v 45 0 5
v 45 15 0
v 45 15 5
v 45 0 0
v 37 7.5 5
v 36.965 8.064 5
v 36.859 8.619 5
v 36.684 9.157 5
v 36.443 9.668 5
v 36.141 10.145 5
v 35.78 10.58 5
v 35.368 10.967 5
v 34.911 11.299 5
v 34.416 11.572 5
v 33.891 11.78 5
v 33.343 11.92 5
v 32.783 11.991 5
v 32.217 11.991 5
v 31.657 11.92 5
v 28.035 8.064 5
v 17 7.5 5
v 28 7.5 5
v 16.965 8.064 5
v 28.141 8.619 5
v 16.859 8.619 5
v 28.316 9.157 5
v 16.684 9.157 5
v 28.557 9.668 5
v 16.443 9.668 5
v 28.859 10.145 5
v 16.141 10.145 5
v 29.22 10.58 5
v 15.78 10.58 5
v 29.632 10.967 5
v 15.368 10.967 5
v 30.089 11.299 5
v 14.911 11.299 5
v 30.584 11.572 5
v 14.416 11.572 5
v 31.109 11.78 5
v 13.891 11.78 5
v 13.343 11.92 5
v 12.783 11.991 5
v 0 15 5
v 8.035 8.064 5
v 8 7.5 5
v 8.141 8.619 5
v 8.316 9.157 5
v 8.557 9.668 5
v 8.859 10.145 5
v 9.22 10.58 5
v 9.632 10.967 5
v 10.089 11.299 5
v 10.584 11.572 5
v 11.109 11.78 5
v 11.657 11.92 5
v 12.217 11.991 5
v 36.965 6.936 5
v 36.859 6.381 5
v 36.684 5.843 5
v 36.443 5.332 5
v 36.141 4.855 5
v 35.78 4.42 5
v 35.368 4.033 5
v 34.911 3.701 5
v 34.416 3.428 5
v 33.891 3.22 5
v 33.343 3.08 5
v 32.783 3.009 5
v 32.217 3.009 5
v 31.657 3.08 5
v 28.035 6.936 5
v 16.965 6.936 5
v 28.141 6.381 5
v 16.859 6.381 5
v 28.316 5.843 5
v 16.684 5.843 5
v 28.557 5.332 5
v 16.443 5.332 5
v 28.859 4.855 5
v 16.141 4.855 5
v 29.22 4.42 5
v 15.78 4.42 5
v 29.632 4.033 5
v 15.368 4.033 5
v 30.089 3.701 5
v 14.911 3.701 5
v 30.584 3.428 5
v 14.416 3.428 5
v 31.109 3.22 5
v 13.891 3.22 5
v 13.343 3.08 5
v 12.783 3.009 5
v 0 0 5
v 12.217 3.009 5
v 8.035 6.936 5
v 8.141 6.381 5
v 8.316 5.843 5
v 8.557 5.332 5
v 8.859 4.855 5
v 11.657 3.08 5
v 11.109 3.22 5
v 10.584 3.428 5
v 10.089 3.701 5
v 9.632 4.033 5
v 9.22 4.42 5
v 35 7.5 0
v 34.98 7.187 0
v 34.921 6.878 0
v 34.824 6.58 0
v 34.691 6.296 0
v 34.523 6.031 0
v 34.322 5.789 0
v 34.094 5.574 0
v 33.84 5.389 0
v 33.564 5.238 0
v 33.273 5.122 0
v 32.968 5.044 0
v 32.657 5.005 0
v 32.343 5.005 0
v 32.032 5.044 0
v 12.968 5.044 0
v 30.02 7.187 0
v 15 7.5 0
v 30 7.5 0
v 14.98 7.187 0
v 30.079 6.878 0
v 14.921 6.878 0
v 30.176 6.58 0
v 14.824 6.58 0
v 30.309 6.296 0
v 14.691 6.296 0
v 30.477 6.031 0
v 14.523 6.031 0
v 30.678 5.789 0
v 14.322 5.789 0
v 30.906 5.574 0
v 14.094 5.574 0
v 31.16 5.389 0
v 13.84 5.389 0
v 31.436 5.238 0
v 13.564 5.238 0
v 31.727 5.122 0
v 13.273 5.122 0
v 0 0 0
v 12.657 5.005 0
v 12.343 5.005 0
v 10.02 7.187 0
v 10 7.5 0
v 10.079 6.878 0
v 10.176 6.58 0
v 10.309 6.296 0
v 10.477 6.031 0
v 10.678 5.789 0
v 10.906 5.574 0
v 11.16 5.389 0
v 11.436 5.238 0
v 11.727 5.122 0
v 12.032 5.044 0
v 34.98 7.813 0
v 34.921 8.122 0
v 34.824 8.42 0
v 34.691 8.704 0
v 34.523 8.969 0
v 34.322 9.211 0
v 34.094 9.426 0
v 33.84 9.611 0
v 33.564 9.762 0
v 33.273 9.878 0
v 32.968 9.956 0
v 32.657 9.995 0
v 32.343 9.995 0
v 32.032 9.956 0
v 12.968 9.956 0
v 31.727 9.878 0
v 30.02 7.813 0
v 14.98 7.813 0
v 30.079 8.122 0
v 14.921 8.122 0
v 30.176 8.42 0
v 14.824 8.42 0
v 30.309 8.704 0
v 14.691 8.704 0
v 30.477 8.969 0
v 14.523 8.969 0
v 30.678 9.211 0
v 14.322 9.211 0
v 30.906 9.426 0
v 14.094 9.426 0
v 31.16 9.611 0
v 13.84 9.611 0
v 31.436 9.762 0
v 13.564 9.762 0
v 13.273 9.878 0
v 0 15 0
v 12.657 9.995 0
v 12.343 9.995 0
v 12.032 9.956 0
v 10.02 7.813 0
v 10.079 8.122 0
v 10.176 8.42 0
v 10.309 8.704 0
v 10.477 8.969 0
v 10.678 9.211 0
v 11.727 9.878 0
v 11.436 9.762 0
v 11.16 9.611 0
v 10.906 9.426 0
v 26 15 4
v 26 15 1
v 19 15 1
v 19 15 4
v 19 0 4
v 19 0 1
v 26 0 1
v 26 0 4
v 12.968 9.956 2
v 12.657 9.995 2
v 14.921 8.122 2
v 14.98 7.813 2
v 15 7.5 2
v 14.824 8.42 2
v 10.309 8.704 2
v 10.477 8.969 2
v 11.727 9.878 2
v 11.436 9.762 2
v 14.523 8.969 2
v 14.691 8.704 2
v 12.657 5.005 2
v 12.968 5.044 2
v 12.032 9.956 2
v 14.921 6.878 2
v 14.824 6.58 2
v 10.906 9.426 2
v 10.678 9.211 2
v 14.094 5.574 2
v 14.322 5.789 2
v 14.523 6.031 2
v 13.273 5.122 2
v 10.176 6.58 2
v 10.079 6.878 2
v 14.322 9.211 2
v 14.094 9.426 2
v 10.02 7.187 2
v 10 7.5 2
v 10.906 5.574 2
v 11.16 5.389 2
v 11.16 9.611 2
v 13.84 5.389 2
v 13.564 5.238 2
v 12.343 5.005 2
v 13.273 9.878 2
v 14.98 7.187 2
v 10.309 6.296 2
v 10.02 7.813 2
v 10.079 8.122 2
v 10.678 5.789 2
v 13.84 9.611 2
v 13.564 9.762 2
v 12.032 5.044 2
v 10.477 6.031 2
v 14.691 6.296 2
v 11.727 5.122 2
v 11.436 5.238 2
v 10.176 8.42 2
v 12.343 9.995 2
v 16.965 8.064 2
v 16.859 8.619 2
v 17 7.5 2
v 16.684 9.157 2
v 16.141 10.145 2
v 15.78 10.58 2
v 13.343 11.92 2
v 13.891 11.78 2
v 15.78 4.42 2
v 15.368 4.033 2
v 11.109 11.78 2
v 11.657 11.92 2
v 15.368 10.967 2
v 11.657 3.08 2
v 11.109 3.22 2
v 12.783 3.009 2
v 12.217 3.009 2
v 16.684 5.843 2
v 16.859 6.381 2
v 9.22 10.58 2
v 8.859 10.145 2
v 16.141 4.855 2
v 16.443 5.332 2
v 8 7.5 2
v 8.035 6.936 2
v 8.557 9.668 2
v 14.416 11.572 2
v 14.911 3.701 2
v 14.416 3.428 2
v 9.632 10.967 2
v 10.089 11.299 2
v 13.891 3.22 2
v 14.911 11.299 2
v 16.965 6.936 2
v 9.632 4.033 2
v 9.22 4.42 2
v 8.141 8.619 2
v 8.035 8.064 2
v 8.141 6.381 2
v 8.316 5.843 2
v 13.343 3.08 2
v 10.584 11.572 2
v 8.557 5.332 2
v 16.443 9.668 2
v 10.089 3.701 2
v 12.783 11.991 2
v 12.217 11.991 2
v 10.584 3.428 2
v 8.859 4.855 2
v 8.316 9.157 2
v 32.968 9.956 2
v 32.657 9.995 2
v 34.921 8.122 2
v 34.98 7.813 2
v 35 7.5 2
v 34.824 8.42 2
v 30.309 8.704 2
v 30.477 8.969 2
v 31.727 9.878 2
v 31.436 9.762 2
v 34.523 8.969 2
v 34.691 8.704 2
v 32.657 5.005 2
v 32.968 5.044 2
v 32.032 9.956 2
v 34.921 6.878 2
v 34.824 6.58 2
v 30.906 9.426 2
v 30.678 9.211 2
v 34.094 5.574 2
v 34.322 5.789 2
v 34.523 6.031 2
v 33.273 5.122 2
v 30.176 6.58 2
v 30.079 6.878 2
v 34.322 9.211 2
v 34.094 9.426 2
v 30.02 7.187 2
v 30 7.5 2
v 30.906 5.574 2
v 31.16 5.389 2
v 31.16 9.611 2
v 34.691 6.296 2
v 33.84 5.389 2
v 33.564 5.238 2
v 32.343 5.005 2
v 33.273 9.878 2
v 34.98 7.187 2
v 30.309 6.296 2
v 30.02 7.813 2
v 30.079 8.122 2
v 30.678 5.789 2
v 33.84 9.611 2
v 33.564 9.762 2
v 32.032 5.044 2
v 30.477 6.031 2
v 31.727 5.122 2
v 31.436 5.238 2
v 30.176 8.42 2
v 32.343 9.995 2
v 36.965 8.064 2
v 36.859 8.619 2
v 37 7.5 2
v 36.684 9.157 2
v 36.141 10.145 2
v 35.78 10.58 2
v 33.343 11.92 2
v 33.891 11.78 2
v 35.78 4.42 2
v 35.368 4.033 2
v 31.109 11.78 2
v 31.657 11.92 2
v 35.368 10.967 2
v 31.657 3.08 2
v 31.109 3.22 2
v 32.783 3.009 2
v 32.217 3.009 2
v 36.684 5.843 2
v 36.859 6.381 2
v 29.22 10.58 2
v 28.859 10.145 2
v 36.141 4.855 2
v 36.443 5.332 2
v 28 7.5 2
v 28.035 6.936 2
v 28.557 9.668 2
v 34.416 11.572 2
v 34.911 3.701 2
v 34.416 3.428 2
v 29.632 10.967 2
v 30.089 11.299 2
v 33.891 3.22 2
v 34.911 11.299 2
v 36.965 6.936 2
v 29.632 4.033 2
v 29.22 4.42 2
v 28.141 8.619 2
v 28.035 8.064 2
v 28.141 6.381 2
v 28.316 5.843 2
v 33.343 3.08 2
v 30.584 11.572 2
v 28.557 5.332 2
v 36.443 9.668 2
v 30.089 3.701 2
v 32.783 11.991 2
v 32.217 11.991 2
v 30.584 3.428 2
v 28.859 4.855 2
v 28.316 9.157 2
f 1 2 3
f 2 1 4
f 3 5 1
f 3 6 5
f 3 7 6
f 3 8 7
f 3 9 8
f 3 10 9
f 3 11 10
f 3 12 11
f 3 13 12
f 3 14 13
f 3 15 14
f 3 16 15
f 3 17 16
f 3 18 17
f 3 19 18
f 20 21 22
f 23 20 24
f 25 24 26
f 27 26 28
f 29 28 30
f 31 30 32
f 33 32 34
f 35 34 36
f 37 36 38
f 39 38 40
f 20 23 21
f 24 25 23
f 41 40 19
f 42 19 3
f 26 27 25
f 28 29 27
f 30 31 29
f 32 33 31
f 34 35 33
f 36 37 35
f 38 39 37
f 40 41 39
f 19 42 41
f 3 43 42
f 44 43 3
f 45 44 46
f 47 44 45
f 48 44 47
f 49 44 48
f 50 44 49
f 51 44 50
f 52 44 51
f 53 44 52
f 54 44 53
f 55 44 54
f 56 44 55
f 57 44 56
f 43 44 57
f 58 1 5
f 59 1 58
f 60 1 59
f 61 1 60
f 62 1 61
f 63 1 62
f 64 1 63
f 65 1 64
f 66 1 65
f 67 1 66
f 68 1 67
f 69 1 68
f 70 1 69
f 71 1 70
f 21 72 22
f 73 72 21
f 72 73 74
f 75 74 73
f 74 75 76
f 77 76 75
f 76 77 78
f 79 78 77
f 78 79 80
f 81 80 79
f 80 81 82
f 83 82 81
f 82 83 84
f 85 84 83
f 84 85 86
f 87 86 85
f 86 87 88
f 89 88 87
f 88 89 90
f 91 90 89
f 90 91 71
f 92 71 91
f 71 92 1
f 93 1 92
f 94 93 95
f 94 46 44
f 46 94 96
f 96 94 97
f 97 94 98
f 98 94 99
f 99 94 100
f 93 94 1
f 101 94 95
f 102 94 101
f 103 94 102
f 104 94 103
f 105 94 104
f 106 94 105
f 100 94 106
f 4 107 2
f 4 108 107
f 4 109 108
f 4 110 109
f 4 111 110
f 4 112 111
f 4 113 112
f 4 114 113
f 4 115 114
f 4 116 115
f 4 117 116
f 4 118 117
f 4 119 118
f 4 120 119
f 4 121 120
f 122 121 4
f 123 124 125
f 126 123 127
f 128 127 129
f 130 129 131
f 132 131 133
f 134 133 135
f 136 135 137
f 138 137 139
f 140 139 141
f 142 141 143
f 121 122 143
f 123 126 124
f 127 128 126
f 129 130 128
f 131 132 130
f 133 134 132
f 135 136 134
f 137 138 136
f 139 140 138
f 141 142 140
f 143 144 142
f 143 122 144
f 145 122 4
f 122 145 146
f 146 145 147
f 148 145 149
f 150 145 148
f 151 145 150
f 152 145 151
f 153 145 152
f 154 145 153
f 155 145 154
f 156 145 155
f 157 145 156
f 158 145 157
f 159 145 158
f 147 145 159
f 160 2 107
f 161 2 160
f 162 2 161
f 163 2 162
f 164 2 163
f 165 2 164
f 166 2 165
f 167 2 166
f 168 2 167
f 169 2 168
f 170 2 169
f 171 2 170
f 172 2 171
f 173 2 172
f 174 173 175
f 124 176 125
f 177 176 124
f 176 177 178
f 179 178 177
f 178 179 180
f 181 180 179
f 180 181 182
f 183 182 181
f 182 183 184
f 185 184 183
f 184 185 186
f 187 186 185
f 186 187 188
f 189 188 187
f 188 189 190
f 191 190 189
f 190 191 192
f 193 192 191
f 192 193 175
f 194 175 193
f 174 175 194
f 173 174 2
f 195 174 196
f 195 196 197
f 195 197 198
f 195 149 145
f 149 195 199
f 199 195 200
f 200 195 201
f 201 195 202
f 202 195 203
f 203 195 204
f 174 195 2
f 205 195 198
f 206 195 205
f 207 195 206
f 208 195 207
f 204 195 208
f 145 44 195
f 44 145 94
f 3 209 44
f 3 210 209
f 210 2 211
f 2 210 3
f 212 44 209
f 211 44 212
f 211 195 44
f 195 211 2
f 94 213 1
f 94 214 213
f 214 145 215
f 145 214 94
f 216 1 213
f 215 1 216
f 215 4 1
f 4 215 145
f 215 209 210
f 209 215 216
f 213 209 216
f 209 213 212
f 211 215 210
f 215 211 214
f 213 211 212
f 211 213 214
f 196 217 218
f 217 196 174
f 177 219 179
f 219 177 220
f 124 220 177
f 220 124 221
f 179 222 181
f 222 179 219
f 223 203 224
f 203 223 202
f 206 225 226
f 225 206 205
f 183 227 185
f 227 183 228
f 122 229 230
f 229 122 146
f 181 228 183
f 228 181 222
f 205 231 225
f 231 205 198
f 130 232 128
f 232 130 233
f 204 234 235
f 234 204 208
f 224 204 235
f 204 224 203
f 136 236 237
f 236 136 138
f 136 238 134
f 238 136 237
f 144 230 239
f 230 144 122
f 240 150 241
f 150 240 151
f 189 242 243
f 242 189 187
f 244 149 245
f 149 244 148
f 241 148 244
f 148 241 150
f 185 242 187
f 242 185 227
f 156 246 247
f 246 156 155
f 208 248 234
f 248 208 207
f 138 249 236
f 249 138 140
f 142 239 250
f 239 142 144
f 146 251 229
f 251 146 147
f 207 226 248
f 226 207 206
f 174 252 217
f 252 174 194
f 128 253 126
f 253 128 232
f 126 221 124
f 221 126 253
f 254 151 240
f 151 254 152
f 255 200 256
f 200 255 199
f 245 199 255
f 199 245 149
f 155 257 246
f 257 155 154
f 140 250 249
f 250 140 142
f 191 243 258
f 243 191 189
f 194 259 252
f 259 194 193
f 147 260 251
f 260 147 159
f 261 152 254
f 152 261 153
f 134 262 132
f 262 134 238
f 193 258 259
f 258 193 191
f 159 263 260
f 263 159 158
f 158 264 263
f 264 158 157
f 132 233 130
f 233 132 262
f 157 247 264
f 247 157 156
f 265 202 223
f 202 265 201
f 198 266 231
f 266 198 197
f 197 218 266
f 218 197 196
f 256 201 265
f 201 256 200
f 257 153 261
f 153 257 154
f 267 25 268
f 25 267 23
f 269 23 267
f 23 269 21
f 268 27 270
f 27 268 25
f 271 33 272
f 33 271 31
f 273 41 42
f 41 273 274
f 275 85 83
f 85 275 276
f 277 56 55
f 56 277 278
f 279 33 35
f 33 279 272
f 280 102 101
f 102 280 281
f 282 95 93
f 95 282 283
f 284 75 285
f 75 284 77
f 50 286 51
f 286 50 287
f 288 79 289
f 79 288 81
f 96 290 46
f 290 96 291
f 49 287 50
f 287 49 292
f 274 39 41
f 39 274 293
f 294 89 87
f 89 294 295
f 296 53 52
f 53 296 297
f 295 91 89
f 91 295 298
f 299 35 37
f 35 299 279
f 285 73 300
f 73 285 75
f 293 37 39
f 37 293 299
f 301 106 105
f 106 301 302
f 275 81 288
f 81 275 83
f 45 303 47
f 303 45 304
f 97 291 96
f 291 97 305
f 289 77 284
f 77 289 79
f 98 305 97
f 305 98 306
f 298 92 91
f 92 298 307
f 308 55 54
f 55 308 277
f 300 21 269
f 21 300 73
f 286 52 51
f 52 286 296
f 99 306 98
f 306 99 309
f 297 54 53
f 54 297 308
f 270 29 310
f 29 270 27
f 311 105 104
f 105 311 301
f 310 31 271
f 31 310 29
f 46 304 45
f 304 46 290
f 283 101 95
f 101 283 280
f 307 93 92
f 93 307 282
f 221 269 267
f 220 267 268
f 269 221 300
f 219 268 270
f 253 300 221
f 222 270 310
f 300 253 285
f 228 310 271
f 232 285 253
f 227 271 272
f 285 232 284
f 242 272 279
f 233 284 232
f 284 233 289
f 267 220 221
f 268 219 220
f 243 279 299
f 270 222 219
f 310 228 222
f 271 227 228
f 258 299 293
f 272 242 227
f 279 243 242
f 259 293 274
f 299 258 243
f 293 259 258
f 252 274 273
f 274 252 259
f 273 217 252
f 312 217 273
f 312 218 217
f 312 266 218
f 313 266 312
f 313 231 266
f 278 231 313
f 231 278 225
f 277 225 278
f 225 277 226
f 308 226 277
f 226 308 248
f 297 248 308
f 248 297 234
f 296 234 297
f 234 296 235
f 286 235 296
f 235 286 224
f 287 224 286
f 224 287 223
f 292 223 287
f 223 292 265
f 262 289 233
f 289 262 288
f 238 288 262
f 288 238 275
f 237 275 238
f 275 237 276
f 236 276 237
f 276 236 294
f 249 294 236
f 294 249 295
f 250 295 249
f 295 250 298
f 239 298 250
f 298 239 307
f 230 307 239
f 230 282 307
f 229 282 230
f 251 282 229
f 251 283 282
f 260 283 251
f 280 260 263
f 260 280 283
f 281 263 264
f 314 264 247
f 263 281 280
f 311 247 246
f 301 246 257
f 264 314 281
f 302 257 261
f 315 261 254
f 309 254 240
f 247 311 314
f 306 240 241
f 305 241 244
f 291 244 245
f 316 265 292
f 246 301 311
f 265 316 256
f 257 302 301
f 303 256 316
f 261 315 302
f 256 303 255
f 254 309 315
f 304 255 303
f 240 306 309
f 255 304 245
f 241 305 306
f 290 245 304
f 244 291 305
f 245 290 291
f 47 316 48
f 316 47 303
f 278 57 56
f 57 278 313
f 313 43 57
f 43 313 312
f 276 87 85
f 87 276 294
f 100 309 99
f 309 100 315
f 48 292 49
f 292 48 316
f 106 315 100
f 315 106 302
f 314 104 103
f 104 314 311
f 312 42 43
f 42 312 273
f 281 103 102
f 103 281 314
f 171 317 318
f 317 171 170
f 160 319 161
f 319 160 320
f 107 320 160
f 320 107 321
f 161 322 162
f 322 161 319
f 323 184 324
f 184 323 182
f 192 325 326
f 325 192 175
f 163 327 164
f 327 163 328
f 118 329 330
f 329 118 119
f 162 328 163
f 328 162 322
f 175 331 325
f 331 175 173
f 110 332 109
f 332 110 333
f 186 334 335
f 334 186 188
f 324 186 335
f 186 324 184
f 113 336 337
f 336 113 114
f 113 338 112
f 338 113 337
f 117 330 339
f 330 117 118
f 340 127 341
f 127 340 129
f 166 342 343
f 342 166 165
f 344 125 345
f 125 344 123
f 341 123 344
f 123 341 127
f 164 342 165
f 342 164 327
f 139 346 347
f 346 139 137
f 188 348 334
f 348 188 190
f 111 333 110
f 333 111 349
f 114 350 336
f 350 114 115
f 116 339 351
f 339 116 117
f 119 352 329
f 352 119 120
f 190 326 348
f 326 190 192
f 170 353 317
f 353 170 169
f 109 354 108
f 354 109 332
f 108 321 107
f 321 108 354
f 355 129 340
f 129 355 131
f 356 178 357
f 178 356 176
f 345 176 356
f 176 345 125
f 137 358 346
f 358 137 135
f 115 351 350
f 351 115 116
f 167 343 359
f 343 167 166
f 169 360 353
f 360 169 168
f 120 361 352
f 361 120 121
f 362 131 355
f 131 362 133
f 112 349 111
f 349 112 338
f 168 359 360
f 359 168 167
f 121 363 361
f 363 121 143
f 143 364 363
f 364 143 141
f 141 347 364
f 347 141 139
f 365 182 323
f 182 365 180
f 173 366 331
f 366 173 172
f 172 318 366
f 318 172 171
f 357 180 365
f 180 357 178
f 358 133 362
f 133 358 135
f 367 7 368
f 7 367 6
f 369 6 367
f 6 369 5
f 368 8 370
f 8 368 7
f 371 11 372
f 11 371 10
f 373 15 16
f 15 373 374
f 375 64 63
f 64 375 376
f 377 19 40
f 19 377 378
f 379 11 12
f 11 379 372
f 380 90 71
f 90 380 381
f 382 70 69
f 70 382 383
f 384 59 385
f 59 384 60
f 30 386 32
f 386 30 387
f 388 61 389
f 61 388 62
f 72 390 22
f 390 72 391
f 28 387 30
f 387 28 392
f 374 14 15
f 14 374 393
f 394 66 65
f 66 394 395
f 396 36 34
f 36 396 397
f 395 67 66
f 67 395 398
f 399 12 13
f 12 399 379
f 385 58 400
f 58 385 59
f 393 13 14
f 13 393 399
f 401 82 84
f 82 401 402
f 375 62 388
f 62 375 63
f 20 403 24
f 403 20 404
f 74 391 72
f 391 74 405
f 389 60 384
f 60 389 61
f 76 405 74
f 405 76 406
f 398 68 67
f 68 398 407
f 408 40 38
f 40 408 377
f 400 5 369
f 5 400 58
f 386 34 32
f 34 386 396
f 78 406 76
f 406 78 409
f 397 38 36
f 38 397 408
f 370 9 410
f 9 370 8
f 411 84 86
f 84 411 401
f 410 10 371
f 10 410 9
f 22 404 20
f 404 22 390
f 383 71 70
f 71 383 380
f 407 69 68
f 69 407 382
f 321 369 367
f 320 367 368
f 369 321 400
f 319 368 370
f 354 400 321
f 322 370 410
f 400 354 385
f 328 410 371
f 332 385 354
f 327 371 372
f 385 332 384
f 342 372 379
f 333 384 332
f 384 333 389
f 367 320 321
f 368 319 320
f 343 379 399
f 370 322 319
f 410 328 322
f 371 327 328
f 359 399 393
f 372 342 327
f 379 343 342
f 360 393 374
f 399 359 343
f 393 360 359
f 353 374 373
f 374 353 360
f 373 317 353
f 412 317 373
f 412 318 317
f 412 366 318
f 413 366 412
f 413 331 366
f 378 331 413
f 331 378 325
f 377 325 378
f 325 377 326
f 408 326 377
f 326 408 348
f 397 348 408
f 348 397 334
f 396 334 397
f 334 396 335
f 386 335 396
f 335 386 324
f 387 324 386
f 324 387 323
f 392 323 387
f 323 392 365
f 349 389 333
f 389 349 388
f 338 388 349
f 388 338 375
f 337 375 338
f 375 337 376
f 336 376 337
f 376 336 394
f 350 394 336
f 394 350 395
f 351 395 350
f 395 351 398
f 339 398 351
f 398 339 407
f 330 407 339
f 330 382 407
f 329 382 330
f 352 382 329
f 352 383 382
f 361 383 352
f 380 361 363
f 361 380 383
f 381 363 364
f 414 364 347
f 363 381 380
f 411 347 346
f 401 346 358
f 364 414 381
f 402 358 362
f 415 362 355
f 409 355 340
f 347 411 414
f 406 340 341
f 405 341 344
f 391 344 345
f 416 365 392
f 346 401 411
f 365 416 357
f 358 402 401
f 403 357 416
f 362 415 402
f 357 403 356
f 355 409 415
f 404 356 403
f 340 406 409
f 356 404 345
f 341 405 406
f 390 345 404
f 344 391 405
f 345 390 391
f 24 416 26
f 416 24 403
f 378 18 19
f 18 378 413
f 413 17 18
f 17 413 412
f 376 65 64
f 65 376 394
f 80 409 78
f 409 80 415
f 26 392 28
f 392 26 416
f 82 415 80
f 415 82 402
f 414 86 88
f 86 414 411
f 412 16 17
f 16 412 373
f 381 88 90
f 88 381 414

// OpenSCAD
w = 45;
l = 15;
h = 5;
strap_h = 3;
strap_w = 7;
strap_inset = 1;

head_d = 9;
body_d = 5;
hole_dist = 20;
hole_inset = 3;

difference(){
    cube( [ w, l, h ] );
    
    translate( [ w / 2 - strap_w / 2, -1, strap_inset ] )
        cube( [ strap_w, l + 2, strap_h ] );    
    
    translate( [ w / 2 - hole_dist / 2, l / 2, -1 ] )
        cylinder( d = body_d, h = h + 2, $fn = 50 );
    translate( [ w / 2 - hole_dist / 2, l / 2, h - hole_inset ] )
        cylinder( d = head_d, h = h + 2, $fn = 50 );

    translate( [ w / 2 + hole_dist / 2, l / 2, -1 ] )
        cylinder( d = body_d, h = h + 2, $fn = 50 );
    translate( [ w / 2 + hole_dist / 2, l / 2, h - hole_inset ] )
        cylinder( d = head_d, h = h + 2, $fn = 50 );
    
}
